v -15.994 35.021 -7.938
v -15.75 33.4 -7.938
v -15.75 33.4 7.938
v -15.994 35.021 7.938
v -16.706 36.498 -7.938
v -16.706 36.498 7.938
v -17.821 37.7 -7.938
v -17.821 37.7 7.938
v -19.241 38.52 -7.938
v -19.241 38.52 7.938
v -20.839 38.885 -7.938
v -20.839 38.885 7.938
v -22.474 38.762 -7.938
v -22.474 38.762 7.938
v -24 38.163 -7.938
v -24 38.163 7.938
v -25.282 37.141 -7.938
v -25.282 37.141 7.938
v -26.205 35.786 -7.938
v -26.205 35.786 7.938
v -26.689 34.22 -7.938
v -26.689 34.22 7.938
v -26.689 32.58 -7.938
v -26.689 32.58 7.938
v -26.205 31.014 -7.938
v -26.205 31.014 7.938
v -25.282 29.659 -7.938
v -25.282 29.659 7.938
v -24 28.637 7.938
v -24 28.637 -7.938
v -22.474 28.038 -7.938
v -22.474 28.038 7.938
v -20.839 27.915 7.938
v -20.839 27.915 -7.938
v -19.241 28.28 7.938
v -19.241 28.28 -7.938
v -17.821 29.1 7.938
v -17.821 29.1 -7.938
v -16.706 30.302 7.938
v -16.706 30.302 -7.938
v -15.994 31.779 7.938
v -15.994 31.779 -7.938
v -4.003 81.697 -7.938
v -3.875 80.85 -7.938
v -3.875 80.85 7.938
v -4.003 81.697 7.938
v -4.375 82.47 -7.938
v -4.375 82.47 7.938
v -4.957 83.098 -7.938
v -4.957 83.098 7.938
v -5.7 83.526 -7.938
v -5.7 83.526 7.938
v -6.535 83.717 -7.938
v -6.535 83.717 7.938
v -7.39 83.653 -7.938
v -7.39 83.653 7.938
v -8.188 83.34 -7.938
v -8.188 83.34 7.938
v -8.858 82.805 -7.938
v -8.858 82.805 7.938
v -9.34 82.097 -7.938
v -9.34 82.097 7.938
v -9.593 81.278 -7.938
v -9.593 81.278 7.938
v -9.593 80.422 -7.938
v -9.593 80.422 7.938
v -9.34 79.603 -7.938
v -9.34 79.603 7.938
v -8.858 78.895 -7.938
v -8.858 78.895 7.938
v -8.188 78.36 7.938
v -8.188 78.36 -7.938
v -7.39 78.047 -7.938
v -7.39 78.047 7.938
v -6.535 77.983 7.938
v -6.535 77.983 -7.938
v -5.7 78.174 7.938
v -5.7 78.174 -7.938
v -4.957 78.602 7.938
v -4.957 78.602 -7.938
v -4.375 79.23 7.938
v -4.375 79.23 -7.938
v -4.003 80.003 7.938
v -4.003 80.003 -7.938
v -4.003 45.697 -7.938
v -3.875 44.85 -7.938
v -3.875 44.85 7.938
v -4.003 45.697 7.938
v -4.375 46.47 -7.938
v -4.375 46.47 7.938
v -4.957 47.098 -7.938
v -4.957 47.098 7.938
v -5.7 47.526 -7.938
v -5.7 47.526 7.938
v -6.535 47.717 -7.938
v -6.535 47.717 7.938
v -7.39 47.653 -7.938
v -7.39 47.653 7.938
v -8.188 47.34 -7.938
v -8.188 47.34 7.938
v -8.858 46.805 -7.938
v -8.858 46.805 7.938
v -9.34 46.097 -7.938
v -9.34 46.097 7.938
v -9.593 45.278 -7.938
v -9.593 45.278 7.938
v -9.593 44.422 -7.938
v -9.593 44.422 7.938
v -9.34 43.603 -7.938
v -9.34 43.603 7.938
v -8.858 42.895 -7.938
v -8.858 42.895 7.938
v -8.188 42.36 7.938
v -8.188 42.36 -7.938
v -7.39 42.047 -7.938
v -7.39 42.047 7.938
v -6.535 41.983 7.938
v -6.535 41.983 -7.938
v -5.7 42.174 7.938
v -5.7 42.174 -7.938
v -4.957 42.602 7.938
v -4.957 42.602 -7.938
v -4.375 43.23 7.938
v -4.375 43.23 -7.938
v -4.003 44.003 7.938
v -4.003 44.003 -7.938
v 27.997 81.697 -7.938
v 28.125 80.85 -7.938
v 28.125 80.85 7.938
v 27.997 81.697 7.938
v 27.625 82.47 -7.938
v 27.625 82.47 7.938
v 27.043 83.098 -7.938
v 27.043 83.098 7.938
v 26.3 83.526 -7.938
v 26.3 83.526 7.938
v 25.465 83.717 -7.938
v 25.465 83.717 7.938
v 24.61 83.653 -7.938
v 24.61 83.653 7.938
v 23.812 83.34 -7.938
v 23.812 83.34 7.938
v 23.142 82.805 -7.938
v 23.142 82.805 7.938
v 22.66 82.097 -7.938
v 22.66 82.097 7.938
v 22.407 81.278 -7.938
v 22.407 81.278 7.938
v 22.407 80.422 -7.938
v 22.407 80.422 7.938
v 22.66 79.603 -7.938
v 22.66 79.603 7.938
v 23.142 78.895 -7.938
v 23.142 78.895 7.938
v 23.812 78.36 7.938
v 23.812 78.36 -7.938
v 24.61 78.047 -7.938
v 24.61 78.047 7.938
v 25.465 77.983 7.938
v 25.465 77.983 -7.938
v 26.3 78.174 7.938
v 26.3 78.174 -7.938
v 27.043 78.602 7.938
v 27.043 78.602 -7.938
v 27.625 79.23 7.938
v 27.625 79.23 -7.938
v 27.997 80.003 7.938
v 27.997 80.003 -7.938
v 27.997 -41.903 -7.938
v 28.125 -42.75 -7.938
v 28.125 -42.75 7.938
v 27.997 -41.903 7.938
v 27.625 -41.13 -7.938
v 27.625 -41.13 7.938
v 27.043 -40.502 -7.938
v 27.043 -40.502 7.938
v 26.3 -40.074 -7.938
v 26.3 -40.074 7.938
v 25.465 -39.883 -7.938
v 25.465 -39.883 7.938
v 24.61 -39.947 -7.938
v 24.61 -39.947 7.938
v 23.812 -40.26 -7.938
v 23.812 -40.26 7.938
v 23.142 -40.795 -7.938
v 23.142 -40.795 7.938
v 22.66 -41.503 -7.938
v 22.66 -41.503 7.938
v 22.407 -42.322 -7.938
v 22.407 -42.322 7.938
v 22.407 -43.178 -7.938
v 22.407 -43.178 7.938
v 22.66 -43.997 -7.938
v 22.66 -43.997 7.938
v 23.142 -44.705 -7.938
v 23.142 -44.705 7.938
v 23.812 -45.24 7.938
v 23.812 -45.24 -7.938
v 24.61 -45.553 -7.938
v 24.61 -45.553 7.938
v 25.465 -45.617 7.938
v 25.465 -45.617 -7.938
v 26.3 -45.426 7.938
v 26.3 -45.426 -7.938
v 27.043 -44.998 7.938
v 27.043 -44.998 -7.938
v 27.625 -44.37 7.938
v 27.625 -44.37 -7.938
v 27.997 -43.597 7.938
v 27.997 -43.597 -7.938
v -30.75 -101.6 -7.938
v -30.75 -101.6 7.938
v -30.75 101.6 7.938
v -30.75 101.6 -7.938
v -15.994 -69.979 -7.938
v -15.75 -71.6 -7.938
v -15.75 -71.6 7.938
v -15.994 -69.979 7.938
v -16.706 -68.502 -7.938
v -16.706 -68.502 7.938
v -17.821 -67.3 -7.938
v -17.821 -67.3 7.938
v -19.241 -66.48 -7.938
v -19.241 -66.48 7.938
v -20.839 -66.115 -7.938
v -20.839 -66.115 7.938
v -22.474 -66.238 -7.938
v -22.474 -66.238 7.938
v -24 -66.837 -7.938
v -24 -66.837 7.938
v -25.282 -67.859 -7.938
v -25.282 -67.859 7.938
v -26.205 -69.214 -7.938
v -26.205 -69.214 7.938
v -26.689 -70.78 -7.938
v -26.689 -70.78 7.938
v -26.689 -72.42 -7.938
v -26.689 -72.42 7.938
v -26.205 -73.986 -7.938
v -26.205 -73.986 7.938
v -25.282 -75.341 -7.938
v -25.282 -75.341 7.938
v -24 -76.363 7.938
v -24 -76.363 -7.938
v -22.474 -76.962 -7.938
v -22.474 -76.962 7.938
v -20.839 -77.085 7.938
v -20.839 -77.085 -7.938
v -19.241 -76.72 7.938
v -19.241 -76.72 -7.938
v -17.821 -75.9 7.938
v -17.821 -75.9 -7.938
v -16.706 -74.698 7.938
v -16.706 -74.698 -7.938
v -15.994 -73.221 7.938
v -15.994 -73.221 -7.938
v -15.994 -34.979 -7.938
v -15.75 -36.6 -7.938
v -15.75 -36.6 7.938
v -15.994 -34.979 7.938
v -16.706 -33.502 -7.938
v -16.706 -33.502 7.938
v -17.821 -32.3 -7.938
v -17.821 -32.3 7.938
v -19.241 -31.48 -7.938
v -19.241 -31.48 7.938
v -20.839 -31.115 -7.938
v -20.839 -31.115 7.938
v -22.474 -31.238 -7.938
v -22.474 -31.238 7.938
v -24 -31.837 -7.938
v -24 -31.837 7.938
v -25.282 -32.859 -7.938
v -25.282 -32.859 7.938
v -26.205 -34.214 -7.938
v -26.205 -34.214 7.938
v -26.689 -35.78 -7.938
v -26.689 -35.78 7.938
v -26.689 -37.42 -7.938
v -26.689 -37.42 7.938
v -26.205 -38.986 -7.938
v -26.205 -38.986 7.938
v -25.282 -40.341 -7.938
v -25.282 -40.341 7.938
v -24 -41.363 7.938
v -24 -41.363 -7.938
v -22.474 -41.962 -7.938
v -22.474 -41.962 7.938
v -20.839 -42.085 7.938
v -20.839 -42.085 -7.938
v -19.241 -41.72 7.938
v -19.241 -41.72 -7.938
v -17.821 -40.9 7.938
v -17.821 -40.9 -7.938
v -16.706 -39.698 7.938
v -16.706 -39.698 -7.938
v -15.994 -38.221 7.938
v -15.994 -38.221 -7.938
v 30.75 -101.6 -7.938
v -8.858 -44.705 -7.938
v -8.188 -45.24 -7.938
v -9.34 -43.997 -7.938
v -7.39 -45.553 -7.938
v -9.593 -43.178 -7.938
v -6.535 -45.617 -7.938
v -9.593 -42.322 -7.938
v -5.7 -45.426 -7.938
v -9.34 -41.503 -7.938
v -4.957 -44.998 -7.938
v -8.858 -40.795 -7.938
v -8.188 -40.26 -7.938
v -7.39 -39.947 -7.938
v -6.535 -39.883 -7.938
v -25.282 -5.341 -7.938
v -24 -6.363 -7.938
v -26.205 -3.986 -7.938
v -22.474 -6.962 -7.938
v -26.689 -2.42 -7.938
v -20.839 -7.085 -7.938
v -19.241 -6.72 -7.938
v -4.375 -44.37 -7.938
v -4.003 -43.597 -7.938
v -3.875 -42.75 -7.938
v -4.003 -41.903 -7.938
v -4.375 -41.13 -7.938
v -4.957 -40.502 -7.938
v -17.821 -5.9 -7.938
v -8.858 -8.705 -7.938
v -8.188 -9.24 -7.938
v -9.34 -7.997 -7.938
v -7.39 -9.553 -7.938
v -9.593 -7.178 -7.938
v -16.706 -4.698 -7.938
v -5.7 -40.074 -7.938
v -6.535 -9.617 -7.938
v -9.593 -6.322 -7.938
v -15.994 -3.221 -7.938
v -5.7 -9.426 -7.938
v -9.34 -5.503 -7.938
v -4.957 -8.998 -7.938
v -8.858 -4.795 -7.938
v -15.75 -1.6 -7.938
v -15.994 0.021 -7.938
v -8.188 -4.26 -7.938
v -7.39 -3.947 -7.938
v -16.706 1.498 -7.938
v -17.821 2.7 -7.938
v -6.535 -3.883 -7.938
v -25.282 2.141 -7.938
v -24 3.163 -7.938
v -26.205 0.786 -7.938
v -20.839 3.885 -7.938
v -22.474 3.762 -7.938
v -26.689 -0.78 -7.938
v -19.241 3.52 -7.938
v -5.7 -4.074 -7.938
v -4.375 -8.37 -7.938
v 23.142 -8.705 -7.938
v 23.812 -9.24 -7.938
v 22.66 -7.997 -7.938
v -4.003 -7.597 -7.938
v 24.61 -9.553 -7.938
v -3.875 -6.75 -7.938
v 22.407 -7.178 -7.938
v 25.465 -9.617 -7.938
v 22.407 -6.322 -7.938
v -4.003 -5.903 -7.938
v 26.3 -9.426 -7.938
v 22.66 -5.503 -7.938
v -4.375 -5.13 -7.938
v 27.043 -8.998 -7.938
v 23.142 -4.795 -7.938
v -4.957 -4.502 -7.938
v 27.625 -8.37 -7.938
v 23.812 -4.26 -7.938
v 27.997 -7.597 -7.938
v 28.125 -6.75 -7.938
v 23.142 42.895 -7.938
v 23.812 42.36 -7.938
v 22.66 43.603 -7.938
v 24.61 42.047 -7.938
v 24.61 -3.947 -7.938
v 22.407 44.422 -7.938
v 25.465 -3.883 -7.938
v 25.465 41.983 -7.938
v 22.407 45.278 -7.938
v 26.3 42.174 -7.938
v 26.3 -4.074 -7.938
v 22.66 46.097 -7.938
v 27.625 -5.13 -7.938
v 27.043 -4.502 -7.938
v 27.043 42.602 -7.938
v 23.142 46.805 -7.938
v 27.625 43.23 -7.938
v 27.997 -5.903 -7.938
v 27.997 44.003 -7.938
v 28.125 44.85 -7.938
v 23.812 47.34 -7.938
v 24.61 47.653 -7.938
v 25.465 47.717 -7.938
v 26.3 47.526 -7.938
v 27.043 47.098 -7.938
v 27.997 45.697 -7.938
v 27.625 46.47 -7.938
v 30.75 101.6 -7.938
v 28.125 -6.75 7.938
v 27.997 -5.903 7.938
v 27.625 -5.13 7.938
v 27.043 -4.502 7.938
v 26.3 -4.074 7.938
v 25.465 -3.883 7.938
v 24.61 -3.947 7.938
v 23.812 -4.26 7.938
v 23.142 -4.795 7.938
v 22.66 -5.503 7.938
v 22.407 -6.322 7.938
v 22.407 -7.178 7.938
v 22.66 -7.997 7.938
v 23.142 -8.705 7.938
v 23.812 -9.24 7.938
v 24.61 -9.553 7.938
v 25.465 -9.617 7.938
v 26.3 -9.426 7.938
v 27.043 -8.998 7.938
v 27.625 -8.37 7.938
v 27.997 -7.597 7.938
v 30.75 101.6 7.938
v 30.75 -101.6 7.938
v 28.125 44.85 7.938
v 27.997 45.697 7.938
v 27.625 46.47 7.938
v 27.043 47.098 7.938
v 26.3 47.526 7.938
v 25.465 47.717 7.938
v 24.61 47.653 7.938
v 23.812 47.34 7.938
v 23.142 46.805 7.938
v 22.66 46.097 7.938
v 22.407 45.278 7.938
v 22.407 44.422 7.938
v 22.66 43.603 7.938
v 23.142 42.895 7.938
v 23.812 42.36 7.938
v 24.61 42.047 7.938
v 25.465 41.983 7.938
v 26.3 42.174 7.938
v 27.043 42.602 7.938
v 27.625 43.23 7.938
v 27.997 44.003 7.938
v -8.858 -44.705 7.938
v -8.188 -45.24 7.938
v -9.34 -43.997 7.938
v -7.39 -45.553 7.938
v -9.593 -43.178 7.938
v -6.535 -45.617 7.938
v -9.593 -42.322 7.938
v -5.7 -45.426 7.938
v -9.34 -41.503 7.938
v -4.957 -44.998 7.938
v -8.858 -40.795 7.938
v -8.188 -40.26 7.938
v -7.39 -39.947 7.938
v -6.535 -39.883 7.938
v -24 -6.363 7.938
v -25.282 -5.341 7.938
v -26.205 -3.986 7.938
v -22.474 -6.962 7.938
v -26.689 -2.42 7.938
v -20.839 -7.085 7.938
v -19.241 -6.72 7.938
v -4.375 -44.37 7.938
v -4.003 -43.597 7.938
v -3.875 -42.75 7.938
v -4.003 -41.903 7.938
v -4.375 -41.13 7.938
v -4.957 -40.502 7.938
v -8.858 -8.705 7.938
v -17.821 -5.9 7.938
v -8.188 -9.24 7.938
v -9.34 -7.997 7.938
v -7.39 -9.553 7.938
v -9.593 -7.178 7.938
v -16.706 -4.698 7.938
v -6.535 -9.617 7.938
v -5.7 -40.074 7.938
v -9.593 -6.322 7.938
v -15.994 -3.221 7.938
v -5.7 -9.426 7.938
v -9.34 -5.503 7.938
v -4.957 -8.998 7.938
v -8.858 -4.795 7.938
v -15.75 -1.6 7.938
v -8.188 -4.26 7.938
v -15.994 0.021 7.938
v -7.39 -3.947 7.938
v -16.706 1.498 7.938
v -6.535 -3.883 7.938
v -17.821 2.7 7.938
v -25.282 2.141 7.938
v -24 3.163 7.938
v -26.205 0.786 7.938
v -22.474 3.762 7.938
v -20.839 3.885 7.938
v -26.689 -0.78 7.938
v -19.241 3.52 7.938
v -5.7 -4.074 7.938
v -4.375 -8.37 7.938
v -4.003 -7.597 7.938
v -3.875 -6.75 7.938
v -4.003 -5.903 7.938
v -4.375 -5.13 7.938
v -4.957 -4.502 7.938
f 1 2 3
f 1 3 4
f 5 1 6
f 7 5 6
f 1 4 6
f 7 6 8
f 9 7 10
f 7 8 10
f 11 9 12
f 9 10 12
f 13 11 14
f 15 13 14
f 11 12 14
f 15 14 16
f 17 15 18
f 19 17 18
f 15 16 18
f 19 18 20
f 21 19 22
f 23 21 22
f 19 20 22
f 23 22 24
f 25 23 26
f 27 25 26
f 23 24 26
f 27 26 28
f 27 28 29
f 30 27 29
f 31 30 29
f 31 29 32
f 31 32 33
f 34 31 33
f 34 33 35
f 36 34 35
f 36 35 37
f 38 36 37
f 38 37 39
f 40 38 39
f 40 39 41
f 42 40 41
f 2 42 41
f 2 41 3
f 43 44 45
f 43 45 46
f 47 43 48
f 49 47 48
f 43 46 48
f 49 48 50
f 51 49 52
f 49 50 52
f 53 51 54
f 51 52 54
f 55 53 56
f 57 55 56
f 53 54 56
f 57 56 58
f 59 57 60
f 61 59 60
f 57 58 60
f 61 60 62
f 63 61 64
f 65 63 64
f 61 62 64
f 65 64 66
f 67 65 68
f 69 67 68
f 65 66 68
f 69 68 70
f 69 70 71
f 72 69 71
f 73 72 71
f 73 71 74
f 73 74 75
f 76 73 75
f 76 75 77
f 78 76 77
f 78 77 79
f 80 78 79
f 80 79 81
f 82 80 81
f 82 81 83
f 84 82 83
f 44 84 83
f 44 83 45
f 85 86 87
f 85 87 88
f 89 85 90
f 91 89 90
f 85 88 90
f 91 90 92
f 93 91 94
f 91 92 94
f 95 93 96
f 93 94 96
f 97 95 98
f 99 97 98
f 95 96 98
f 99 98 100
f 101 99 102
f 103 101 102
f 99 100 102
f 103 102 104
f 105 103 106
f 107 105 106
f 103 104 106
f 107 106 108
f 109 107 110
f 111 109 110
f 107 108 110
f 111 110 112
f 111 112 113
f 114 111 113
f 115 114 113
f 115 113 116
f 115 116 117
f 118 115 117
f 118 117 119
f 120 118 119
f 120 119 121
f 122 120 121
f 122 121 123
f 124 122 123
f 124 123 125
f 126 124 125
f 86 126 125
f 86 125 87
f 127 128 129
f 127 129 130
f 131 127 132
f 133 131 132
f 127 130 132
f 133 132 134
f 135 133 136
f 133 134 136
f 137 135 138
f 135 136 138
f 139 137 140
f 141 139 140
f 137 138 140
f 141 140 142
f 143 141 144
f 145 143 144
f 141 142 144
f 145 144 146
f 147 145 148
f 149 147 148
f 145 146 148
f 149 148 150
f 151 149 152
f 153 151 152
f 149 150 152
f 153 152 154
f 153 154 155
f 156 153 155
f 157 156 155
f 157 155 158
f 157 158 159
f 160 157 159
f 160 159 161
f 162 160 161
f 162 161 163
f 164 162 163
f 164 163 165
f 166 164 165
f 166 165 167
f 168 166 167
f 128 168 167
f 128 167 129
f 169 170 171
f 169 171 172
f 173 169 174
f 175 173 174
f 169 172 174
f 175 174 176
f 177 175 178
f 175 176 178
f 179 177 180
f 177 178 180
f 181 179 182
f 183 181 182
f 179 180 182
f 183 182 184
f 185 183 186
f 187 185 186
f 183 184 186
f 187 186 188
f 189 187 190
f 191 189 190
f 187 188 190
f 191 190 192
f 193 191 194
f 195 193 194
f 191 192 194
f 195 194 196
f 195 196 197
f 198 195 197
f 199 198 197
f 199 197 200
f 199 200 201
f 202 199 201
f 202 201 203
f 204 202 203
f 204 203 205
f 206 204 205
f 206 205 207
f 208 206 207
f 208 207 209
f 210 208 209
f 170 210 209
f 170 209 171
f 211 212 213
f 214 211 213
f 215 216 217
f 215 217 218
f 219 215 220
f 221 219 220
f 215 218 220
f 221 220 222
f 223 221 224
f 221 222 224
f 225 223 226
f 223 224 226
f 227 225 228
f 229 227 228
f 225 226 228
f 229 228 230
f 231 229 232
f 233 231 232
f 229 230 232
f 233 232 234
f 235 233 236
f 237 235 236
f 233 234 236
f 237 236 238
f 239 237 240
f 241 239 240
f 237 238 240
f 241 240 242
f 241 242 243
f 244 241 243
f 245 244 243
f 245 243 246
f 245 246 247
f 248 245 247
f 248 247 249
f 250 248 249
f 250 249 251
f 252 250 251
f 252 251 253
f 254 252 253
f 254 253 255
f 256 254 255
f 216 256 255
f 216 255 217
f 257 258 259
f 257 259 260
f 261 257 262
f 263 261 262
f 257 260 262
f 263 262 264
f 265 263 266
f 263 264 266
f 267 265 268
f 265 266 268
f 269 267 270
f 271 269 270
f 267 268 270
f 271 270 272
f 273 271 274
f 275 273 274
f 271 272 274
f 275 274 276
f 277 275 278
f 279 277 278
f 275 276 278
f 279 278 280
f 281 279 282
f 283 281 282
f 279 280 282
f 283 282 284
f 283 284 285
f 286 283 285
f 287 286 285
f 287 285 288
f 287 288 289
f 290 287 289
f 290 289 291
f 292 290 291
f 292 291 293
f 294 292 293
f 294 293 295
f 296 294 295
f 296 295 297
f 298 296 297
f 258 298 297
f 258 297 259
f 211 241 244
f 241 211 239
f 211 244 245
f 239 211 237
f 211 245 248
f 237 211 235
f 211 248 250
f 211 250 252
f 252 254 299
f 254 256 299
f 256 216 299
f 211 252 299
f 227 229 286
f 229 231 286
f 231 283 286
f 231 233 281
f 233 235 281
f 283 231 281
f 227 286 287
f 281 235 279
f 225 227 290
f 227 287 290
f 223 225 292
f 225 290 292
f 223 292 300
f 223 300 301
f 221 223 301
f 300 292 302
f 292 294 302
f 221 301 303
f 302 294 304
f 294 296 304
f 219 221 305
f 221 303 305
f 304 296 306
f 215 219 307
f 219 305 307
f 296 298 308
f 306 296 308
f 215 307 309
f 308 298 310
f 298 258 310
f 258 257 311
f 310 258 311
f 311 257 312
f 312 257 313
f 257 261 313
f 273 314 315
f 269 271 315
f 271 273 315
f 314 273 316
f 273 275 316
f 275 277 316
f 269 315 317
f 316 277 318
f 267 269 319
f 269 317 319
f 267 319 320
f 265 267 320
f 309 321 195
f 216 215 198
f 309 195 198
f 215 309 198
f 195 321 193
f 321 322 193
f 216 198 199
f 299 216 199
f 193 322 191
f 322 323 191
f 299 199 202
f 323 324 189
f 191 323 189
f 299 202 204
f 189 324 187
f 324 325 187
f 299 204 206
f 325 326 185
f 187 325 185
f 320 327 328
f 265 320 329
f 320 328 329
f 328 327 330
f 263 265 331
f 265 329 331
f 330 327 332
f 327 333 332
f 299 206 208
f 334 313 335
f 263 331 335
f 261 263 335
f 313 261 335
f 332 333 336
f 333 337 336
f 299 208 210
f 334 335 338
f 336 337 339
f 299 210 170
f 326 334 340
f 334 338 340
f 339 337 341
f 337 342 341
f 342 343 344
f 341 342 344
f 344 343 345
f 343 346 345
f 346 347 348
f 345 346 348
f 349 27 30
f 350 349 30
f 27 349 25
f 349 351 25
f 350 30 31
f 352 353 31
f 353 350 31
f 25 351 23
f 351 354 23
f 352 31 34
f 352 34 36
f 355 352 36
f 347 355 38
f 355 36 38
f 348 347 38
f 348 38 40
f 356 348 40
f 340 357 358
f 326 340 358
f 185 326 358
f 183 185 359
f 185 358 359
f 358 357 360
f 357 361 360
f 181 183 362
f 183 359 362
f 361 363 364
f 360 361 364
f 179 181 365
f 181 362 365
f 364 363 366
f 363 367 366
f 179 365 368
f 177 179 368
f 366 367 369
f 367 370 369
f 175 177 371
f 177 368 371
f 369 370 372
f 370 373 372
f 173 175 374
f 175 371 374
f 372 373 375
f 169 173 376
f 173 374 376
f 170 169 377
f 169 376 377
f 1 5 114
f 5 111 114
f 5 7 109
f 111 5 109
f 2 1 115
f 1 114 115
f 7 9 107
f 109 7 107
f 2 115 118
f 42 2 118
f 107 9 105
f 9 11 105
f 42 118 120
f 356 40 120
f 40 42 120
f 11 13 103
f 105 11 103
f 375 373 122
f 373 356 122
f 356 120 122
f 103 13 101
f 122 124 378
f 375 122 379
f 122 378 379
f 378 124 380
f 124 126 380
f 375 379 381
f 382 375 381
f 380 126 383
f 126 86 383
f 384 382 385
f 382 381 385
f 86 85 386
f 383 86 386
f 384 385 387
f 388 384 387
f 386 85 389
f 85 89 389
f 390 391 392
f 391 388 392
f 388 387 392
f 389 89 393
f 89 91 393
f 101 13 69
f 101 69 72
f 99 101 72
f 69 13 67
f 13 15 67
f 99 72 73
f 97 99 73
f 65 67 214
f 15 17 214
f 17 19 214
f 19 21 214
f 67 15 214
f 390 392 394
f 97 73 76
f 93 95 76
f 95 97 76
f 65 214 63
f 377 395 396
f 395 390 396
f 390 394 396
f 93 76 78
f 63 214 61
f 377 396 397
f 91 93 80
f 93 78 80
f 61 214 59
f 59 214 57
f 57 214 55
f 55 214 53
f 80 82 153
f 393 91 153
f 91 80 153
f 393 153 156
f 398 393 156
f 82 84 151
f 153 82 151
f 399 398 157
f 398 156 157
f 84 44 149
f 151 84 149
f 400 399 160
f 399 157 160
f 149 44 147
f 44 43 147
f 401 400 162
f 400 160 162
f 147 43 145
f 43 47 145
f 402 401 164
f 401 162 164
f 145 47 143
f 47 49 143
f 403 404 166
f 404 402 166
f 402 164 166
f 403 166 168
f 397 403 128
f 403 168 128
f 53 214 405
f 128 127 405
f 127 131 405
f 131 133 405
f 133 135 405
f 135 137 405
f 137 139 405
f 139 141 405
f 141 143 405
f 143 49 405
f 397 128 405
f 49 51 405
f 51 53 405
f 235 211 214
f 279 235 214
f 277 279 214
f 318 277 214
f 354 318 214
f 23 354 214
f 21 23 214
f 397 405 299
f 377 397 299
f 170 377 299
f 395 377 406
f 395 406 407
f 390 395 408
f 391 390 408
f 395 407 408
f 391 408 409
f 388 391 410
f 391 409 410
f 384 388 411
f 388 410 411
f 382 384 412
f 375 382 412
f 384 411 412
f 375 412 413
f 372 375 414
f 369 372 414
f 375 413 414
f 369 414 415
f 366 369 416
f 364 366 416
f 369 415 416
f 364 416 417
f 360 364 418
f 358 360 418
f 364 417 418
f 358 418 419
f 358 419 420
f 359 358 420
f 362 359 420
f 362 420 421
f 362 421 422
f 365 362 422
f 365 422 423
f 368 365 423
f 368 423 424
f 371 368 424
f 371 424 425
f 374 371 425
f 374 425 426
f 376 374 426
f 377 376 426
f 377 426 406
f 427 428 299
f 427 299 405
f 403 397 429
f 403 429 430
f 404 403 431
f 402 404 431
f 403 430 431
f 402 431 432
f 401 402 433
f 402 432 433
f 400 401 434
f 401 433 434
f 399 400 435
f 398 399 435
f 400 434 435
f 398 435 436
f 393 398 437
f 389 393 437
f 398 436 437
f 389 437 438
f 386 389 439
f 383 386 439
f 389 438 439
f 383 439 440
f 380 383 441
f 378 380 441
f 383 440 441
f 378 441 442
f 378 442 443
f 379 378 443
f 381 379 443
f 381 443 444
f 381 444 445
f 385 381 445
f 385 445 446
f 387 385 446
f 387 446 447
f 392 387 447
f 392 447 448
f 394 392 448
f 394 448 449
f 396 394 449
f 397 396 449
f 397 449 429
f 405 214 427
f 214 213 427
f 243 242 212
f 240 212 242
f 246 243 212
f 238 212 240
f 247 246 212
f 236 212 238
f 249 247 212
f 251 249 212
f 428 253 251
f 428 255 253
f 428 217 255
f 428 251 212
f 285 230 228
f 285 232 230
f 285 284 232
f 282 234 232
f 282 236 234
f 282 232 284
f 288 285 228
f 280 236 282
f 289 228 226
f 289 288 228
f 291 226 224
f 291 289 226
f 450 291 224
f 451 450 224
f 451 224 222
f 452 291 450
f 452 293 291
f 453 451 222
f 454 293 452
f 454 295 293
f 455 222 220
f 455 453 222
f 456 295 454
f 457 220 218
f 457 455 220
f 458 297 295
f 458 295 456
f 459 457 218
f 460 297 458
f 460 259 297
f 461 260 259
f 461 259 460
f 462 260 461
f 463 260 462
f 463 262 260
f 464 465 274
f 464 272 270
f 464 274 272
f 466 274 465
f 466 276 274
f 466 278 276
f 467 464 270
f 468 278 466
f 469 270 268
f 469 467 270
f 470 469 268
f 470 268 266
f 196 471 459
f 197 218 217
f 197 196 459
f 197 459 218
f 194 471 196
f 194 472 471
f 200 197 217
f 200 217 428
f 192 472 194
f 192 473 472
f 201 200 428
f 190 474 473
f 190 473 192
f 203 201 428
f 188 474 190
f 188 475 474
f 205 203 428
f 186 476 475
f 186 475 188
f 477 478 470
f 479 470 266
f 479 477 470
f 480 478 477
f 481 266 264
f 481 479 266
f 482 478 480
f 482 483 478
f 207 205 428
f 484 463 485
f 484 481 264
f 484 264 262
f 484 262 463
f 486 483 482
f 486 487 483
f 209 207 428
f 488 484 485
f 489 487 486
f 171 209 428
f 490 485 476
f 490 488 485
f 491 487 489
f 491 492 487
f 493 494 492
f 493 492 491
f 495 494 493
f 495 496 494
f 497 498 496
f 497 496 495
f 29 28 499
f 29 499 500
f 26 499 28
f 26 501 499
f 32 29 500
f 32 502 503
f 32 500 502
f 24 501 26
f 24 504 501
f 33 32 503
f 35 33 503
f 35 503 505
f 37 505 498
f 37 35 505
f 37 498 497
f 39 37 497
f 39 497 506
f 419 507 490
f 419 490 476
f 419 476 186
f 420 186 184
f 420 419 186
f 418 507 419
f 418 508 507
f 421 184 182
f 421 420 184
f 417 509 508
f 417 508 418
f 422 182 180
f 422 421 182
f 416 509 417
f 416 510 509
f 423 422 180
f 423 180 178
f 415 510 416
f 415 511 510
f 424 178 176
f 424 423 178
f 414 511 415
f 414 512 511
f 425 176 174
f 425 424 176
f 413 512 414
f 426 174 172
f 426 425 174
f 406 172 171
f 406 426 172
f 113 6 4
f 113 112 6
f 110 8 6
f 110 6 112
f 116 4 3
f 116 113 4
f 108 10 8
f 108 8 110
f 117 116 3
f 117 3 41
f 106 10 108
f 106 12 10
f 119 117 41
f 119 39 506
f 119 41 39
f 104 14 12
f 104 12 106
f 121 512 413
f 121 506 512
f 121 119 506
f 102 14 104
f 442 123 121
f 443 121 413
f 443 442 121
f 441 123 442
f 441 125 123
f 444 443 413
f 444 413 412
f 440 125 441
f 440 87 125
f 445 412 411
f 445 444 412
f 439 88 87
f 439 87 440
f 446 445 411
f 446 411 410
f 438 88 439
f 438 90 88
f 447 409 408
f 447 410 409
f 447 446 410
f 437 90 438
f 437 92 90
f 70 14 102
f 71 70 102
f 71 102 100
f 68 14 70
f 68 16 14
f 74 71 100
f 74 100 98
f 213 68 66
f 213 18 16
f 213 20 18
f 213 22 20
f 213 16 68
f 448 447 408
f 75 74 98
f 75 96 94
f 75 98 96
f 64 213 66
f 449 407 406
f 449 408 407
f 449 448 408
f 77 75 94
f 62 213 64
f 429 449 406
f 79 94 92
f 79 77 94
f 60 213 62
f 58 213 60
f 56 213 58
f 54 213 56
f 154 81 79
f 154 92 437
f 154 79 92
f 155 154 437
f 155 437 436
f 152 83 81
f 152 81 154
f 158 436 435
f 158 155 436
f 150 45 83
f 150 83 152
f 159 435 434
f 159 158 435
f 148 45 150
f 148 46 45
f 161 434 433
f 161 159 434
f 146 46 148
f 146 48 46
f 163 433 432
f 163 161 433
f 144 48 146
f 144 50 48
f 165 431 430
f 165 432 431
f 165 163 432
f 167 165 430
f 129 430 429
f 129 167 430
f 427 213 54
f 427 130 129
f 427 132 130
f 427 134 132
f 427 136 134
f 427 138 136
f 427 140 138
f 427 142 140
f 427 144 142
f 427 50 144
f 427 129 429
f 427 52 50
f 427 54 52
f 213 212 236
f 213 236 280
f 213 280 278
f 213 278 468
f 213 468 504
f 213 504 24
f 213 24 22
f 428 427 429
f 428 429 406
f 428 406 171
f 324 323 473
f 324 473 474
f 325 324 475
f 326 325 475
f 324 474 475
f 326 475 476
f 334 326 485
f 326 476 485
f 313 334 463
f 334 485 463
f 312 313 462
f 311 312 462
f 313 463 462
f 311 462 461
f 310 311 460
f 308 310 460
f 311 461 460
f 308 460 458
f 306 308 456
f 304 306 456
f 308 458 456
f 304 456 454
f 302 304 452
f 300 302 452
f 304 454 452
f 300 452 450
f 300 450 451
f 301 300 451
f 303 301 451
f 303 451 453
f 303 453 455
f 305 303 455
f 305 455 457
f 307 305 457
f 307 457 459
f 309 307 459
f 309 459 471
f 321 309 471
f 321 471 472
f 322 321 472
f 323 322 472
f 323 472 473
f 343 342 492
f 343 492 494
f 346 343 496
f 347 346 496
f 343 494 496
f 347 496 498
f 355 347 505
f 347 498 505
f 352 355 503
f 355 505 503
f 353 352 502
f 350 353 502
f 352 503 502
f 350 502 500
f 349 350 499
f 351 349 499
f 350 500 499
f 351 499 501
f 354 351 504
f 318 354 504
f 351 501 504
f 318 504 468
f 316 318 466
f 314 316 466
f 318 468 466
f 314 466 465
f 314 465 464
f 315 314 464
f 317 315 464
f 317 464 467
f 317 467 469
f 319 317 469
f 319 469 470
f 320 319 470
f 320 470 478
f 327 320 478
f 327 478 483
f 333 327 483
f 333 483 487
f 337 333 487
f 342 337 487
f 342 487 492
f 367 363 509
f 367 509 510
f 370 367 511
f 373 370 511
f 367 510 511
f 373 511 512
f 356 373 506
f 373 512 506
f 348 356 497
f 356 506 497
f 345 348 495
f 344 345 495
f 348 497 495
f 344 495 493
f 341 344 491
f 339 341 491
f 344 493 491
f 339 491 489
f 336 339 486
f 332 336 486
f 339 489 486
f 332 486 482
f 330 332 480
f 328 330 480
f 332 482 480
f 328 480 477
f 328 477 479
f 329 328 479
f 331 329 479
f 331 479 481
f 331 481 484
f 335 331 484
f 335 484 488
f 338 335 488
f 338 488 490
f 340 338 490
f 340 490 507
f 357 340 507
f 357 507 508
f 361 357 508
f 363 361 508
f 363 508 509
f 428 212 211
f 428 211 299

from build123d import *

# Parameters (mm, degrees)
SKETCH1_W           = 61.5
SKETCH1_H           = 203.2
BOSS_EXTRUDE1_DEPTH = 7.9375
SKETCH2_R           = 5.5
CUT_EXTRUDE1_DEPTH  = 16.875
SKETCH3_R           = 2.875
CUT_EXTRUDE2_DEPTH  = 16.875
LPATTERN1_COUNT     = 2
LPATTERN1_PITCH     = 32


with BuildPart() as part:
    # Sketch1 → Boss-Extrude1 (new body, symmetric)
    with BuildSketch(Plane.XY):
        Rectangle(SKETCH1_W, SKETCH1_H)
    extrude(amount=BOSS_EXTRUDE1_DEPTH, both=True)

    # Sketch2 → Cut-Extrude1 (cut, through all)
    with BuildSketch(Plane.XY.offset(7.9375)):
        with Locations((-21.25, 33.4)):
            Circle(SKETCH2_R)
        with Locations((-21.25, -1.6)):
            Circle(SKETCH2_R)
        with Locations((-21.25, -36.6)):
            Circle(SKETCH2_R)
        with Locations((-21.25, -71.6)):
            Circle(SKETCH2_R)
    extrude(amount=-CUT_EXTRUDE1_DEPTH, mode=Mode.SUBTRACT)

    # Sketch3 → Cut-Extrude2 (cut, through all)
    with BuildSketch(Plane.XY.offset(7.9375)):
        with Locations((-6.75, 80.85)):
            Circle(SKETCH3_R)
        with Locations((-6.75, 44.85)):
            Circle(SKETCH3_R)
        with Locations((-6.75, -6.75)):
            Circle(SKETCH3_R)
        with Locations((-6.75, -42.75)):
            Circle(SKETCH3_R)
    cut_extrude2 = extrude(amount=-CUT_EXTRUDE2_DEPTH, mode=Mode.SUBTRACT)

    # LPattern1: Cut-Extrude2 ×2
    with Locations(*[(i * LPATTERN1_PITCH, 0, 0) for i in range(1, LPATTERN1_COUNT)]):
        add(cut_extrude2, mode=Mode.SUBTRACT)


solid = part.part
